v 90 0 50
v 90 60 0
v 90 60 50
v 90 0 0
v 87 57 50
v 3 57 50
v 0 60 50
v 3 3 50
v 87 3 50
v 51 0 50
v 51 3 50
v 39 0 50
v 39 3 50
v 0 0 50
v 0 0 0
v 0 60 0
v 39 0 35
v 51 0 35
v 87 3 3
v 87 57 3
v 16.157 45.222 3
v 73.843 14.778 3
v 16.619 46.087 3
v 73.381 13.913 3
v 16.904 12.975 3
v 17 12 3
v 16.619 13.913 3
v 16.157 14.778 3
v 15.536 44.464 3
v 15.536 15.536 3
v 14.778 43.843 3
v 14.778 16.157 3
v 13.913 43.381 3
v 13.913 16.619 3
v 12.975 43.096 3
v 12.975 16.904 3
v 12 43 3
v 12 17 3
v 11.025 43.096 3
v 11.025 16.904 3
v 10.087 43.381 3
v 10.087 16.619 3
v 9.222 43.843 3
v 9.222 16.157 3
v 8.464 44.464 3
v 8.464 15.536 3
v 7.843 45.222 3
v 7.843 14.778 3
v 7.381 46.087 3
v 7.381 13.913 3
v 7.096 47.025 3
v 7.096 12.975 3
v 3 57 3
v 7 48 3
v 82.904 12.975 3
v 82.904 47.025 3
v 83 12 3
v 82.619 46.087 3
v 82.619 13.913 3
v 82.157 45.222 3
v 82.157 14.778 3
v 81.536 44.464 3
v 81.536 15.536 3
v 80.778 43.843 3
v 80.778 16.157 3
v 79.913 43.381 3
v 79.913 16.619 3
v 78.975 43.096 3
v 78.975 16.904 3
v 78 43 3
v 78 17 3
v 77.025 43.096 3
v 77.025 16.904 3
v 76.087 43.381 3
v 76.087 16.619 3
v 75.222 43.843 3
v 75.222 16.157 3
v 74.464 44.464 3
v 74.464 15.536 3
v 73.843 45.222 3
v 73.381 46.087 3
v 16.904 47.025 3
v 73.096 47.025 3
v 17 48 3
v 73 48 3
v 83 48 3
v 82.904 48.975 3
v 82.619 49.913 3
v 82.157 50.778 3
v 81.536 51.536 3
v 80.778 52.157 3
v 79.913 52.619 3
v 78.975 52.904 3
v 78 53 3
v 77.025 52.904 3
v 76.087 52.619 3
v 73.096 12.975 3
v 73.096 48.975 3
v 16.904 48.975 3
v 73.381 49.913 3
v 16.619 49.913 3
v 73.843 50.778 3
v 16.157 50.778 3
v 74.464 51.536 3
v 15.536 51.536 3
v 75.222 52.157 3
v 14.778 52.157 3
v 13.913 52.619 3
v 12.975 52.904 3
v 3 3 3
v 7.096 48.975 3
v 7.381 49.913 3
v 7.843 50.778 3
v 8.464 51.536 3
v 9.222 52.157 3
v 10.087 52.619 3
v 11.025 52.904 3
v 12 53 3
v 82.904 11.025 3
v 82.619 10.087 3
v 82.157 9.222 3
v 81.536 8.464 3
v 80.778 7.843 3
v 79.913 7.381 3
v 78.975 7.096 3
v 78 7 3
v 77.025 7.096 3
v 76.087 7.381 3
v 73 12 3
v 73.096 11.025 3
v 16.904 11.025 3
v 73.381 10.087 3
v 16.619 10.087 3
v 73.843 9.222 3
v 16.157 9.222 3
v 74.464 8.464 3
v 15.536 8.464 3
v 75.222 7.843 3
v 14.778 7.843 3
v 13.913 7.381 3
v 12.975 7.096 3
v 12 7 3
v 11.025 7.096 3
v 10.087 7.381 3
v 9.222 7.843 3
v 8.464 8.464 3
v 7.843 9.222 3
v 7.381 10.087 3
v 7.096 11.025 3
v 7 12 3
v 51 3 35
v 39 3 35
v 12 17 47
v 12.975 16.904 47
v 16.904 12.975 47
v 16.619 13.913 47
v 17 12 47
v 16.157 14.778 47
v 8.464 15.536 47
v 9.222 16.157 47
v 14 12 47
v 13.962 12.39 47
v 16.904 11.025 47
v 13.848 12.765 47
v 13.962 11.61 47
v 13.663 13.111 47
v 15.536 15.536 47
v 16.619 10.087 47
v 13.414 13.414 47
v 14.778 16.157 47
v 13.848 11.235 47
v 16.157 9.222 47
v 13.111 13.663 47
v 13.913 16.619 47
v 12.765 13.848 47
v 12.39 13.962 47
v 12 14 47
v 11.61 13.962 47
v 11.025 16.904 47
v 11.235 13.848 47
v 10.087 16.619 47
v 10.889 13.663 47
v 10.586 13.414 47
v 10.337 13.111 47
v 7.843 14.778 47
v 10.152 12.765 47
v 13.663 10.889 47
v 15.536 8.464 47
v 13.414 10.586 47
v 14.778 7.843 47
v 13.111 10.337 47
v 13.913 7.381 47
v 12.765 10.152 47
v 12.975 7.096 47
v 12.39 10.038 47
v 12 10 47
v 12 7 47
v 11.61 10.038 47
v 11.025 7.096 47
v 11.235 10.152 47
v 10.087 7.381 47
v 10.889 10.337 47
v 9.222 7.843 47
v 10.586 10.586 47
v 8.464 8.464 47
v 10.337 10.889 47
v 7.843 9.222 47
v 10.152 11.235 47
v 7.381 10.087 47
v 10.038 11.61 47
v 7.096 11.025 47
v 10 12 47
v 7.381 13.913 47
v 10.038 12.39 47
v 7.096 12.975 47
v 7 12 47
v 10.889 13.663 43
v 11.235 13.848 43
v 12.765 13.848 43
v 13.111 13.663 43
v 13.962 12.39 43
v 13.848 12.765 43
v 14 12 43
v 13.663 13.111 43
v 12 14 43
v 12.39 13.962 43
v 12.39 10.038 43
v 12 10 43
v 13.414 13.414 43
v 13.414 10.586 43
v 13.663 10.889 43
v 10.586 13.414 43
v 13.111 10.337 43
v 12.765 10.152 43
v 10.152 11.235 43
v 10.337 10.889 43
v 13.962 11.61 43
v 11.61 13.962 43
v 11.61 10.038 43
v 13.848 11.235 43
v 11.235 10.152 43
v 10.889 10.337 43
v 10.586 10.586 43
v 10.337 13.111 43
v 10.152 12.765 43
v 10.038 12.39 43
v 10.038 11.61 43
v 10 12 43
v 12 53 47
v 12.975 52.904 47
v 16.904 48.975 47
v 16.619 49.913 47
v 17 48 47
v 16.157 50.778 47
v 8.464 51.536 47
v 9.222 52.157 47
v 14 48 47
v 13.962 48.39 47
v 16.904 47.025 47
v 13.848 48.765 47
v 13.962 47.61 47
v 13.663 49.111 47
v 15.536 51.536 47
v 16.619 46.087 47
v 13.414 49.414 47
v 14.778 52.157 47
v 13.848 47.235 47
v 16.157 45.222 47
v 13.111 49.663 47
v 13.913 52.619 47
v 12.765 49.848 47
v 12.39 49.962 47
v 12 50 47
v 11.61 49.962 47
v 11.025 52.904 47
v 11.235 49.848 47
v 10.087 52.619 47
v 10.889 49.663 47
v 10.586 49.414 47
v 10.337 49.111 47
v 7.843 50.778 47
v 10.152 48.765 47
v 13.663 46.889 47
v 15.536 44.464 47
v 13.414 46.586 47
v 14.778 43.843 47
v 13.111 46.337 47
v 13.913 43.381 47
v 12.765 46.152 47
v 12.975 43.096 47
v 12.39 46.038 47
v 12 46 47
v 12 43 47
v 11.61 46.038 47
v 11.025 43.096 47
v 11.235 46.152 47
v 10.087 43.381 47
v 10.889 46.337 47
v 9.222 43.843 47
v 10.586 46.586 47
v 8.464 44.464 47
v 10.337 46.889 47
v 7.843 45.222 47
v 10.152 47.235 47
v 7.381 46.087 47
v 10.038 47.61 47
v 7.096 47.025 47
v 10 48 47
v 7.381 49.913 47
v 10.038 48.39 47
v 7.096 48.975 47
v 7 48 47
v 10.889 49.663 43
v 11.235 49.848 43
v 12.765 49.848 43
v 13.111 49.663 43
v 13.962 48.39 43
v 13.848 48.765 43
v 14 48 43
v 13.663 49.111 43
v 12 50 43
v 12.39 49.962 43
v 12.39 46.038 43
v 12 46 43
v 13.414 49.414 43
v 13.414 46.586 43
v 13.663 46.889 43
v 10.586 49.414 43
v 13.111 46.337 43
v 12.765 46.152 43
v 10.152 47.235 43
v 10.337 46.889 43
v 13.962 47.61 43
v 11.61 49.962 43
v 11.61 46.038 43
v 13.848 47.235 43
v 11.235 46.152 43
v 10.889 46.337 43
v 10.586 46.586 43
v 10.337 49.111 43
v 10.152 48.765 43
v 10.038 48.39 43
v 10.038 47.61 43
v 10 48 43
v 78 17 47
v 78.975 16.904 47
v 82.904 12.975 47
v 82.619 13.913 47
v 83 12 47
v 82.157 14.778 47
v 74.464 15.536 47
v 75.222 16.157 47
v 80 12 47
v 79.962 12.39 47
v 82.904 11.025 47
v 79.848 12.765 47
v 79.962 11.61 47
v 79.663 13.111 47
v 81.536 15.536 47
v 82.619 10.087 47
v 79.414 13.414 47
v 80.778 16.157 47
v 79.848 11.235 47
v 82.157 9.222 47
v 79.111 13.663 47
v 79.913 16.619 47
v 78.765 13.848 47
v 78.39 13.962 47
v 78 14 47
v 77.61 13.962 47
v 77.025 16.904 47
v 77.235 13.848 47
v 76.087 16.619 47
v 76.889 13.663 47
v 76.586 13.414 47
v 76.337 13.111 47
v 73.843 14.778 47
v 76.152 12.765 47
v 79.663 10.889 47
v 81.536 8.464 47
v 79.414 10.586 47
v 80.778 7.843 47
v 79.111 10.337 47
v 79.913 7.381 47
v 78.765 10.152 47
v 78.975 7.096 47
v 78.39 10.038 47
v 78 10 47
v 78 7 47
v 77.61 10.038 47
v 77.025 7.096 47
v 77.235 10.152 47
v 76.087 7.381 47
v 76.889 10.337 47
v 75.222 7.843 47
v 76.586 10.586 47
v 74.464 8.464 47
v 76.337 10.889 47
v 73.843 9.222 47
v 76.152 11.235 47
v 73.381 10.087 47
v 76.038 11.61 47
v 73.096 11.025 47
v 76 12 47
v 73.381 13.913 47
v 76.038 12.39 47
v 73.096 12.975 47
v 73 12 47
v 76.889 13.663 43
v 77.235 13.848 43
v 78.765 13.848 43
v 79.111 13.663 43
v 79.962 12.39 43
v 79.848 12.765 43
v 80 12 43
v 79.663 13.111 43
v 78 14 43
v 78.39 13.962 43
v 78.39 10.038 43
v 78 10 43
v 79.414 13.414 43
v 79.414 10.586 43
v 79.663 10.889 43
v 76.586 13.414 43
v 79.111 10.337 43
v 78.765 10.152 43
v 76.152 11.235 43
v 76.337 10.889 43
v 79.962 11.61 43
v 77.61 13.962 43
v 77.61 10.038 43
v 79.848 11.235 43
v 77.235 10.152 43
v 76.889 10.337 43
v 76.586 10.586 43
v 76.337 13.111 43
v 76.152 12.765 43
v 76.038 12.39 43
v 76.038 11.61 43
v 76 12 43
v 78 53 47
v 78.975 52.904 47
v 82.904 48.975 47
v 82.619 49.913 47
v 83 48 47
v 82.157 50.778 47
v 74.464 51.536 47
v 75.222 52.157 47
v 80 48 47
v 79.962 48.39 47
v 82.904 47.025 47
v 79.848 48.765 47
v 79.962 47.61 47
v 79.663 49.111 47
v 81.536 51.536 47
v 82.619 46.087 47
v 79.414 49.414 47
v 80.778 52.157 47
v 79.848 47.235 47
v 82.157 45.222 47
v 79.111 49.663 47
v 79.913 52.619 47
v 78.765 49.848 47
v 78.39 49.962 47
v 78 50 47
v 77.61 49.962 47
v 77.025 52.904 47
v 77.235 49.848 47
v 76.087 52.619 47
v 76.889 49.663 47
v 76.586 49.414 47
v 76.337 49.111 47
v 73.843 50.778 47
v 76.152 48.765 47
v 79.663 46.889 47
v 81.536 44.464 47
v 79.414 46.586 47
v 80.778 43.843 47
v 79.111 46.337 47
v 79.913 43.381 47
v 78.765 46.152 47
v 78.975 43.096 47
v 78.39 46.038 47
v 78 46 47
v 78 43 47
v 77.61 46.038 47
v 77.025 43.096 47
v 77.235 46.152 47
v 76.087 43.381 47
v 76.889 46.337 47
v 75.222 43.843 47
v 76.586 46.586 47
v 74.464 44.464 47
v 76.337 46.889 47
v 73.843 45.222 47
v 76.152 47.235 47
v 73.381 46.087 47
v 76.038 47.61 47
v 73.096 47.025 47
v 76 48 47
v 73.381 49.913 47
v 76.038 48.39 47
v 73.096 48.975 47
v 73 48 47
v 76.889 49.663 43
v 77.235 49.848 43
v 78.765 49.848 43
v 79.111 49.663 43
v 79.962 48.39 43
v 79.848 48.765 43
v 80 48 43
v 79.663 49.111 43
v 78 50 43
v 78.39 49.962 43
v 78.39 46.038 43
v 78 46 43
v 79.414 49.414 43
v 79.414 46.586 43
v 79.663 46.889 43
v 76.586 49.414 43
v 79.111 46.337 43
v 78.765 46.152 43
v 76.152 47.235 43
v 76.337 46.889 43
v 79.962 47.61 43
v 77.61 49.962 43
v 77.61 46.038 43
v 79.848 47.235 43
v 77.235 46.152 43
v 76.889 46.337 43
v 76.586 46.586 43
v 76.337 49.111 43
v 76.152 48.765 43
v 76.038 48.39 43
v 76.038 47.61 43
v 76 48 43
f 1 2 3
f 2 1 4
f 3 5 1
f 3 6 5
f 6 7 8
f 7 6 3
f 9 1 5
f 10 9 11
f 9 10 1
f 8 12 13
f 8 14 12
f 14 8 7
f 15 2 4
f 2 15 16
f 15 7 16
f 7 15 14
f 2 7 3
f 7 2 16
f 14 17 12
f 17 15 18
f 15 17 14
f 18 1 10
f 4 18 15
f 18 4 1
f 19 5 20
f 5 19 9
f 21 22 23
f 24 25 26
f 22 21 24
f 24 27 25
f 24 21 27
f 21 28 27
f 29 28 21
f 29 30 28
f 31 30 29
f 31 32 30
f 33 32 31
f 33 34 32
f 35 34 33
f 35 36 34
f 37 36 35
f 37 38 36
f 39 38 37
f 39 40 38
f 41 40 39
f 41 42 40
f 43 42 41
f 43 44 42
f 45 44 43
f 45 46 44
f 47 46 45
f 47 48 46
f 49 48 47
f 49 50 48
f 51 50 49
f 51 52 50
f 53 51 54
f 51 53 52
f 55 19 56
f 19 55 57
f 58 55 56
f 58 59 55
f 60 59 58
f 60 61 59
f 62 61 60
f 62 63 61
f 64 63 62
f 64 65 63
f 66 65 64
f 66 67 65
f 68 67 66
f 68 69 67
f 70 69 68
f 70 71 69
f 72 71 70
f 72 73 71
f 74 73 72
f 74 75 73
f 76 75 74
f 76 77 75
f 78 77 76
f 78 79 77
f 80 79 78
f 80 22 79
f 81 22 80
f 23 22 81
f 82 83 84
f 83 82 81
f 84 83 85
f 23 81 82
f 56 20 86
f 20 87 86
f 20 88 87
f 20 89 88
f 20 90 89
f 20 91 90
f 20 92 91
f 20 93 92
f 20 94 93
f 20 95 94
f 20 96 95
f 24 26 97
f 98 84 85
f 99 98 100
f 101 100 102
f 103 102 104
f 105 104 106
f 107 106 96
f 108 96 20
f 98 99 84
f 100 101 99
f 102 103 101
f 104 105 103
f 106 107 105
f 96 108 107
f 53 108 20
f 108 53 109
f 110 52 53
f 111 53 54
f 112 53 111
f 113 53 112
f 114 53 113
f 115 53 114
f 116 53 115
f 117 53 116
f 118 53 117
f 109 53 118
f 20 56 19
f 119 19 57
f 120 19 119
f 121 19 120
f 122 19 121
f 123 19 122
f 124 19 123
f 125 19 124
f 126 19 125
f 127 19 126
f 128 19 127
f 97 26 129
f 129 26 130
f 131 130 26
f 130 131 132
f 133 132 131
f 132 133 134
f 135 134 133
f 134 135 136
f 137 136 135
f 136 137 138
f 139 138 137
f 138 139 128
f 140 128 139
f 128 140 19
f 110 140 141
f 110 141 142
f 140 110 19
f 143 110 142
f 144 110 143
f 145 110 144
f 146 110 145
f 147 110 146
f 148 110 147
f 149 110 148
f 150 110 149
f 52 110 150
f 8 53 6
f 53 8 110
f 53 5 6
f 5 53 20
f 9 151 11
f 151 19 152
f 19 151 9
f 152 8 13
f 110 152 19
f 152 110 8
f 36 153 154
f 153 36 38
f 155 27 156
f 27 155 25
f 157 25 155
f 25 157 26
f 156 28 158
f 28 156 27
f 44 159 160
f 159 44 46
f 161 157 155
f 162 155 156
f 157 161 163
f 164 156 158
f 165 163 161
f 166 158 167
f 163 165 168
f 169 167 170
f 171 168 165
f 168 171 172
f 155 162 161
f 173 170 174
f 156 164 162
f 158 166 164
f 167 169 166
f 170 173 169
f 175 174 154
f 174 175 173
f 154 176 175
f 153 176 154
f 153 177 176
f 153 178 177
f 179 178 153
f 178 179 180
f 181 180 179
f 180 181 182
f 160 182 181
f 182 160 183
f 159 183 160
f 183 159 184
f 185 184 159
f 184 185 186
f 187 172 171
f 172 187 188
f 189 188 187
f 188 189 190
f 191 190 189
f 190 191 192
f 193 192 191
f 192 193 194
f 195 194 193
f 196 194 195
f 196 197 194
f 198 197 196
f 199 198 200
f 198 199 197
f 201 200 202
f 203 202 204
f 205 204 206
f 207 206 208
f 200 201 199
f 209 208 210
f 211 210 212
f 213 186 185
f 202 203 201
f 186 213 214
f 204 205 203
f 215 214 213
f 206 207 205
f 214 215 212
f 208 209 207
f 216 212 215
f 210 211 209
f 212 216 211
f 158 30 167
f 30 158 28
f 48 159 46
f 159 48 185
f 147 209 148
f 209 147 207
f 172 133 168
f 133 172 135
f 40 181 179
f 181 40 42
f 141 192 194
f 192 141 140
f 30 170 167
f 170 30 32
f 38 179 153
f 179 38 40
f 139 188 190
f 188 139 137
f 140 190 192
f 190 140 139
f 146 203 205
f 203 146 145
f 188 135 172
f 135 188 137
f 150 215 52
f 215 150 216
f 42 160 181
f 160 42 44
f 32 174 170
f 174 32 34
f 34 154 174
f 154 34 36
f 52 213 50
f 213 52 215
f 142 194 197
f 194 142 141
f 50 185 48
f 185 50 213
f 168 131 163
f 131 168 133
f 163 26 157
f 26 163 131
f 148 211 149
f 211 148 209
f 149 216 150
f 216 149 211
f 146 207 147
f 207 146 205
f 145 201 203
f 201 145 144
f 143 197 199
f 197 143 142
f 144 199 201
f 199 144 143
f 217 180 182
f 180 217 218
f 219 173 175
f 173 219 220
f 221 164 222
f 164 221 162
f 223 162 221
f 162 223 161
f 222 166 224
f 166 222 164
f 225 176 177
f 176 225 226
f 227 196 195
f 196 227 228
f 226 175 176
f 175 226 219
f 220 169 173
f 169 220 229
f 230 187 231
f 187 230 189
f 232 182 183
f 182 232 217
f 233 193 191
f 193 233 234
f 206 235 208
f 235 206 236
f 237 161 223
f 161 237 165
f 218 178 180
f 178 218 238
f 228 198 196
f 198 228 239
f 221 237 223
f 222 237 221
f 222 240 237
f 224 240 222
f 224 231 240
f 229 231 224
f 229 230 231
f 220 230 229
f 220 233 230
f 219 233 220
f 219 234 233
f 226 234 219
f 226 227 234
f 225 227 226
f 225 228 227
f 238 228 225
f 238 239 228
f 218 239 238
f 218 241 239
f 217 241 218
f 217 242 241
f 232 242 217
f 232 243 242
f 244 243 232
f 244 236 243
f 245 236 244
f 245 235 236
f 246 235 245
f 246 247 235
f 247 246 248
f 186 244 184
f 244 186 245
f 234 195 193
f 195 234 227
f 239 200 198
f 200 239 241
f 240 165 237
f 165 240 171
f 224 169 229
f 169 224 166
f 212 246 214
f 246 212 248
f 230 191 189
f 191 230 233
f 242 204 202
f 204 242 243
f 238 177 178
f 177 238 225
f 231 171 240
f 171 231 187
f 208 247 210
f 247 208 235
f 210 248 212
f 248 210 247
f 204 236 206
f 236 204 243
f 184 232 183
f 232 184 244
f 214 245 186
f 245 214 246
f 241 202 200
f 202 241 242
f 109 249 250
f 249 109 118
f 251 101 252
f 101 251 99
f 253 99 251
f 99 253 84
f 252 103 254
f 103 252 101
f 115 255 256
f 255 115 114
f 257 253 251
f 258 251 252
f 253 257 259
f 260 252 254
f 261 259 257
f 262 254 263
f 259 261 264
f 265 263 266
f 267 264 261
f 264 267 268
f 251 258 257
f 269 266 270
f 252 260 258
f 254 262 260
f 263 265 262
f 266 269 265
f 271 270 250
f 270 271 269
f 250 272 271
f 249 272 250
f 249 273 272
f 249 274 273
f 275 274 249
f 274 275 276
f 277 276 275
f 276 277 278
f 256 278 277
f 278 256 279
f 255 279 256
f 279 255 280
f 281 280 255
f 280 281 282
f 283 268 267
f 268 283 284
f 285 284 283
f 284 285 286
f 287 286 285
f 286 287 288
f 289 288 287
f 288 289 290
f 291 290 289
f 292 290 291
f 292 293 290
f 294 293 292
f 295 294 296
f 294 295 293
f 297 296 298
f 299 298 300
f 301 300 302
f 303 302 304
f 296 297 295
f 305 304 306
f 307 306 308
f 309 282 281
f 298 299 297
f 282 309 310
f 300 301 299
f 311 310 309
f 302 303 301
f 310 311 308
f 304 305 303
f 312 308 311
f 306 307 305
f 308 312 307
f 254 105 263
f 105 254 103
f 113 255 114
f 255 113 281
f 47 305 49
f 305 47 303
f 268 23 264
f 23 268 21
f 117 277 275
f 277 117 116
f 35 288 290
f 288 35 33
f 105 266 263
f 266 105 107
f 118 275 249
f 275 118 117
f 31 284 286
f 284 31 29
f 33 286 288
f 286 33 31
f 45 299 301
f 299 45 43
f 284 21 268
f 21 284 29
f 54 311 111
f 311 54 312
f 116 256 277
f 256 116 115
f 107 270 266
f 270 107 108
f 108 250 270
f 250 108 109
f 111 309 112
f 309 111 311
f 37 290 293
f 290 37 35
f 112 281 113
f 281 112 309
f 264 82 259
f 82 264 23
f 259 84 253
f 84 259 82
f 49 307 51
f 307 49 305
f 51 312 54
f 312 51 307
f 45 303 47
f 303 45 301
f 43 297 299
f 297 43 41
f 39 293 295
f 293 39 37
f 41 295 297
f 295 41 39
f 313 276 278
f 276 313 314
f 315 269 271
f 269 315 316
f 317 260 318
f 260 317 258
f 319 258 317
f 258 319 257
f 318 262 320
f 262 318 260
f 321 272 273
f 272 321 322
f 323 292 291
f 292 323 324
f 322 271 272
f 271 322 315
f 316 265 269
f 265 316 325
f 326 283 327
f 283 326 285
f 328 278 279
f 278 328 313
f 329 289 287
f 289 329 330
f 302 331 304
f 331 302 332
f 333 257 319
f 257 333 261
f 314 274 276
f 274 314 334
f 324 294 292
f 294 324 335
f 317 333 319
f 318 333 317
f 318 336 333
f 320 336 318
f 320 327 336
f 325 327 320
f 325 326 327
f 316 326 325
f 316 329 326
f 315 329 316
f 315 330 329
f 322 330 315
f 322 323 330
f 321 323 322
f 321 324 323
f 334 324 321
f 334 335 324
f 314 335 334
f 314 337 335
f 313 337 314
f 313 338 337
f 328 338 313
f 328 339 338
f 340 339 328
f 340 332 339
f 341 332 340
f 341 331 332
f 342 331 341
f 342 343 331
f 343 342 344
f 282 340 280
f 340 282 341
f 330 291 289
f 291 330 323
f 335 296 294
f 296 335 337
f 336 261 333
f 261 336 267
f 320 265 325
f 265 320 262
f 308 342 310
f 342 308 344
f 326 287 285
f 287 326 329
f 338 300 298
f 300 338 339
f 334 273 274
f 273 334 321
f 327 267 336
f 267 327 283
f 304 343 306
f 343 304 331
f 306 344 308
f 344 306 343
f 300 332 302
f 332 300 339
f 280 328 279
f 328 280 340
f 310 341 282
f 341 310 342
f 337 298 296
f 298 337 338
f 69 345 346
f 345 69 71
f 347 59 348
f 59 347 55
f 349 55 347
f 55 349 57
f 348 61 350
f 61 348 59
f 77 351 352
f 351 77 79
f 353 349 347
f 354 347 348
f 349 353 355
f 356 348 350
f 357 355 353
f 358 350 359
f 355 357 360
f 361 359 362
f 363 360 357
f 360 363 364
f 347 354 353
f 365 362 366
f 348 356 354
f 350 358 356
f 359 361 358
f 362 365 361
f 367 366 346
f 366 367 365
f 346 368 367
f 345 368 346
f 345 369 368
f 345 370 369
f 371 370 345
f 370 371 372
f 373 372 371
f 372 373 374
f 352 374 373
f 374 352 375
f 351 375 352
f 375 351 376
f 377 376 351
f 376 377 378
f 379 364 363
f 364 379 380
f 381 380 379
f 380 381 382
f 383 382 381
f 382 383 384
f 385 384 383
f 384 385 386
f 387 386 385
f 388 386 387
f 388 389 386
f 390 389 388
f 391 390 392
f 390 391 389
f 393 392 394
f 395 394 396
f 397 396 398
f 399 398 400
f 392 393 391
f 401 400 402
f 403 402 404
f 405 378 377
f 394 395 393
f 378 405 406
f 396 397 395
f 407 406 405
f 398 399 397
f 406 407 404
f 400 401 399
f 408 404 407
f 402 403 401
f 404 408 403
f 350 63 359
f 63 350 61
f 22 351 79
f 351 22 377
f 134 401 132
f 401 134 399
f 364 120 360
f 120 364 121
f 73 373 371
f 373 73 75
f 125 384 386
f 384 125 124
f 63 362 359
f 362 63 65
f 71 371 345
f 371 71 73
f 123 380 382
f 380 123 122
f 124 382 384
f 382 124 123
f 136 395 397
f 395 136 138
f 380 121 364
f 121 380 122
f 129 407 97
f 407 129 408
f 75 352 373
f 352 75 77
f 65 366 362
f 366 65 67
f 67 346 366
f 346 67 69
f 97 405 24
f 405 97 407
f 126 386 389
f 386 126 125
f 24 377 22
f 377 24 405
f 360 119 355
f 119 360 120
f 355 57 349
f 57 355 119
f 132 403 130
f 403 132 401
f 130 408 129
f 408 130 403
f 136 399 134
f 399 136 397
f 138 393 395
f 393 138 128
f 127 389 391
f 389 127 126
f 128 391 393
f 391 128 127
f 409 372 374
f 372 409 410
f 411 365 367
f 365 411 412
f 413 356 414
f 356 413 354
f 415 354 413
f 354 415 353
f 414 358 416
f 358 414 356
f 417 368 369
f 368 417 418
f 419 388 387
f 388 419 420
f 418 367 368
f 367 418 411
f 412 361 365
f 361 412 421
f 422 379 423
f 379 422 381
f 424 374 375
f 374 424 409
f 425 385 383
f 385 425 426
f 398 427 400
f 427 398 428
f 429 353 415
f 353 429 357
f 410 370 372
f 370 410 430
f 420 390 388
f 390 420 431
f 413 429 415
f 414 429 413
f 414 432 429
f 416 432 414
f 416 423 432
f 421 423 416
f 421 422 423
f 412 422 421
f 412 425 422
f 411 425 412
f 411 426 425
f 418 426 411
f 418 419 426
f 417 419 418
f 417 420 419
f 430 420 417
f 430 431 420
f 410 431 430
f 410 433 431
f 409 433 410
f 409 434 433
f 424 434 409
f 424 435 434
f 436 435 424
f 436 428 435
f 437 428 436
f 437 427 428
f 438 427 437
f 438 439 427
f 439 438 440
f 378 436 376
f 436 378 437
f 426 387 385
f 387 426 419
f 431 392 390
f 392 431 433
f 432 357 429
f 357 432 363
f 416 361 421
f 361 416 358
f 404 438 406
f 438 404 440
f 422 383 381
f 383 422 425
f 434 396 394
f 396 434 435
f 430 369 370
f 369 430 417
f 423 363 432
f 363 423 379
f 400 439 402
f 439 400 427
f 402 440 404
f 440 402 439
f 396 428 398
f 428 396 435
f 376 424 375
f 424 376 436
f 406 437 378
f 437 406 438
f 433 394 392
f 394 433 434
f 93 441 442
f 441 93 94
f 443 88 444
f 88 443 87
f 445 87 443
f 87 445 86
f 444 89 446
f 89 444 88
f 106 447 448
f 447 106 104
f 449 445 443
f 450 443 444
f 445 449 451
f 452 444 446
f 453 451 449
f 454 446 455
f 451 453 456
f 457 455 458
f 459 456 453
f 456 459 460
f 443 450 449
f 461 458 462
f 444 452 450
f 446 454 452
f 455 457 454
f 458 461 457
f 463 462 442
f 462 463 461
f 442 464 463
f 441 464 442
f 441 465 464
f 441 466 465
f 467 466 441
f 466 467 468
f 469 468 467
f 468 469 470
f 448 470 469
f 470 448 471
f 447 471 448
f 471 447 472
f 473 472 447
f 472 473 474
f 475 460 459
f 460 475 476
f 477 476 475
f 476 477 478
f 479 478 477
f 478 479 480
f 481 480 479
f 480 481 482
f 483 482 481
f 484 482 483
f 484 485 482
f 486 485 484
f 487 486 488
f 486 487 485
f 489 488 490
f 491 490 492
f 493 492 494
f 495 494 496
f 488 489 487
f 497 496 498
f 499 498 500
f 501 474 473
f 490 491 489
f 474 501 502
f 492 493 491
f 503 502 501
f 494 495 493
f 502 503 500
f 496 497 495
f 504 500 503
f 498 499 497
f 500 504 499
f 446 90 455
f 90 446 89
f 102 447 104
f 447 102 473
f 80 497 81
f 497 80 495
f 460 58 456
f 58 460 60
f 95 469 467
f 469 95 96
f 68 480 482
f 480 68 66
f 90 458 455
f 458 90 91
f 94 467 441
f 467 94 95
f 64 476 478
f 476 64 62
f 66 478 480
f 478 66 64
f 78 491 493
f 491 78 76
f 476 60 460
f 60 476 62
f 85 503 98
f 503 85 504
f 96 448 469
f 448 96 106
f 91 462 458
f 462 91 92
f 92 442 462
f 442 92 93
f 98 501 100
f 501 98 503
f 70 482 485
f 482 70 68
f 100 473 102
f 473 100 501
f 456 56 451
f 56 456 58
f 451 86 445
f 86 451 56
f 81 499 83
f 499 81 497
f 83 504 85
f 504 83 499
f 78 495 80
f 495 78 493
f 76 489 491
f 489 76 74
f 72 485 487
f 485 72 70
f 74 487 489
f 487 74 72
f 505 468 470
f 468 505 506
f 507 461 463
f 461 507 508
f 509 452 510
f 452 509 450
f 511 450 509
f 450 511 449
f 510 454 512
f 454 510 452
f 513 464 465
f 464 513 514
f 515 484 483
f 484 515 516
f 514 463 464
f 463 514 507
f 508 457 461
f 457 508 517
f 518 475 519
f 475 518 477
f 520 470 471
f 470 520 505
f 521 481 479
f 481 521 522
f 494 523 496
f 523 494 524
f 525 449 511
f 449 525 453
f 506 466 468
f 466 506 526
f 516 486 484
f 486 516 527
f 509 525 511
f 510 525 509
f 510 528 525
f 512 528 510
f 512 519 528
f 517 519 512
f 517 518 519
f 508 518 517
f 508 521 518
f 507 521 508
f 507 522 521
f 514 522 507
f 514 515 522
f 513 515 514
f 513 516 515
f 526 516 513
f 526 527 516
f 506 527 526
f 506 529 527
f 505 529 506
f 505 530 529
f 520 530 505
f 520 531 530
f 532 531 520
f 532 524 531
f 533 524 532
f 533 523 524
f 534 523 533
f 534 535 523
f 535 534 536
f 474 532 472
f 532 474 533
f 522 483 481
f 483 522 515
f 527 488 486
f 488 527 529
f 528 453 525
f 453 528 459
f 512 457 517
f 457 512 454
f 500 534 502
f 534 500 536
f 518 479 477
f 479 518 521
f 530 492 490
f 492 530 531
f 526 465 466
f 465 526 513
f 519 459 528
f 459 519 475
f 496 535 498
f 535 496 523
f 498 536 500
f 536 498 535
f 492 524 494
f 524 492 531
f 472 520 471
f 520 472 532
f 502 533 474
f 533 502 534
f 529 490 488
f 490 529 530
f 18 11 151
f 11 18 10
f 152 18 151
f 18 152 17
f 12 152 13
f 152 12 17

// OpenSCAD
$fn = 32;

// ----------------------------------------------------------------------
// Enclosure box: both enclosure
// ----------------------------------------------------------------------

// --- parameters (mm) ---
box_l = 90;               // outer length, X
box_w = 60;               // outer width, Y
box_h = 50;               // outer height
wall_t = 3;               // wall thickness
boss_r = 5;               // corner boss radius
hole_r = 2;               // boss screw hole radius
boss_in = 12;             // boss inset from the corners
notch_w = 12;             // cable notch width
notch_h = 15;             // cable notch height

inner_h = box_h - wall_t;  // cavity depth
boss_h = inner_h - 2;  // corner boss height

difference() {
  union() {
    difference() {
      cube([box_l, box_w, box_h]);
      translate([wall_t, wall_t, wall_t])
        cube([box_l - 2 * wall_t, box_w - 2 * wall_t, box_h]);
    }
    for (sx = [0, 1], sy = [0, 1])
      translate([sx ? box_l - boss_in : boss_in,
                 sy ? box_w - boss_in : boss_in, wall_t - 1])
        difference() {
          cylinder(r = boss_r, h = boss_h);
          translate([0, 0, boss_h - 4])
            cylinder(r = hole_r, h = 5);
        }
  }
  translate([box_l / 2 - notch_w / 2, -1, box_h - notch_h])
    cube([notch_w, wall_t + 2, notch_h + 1]);
}
